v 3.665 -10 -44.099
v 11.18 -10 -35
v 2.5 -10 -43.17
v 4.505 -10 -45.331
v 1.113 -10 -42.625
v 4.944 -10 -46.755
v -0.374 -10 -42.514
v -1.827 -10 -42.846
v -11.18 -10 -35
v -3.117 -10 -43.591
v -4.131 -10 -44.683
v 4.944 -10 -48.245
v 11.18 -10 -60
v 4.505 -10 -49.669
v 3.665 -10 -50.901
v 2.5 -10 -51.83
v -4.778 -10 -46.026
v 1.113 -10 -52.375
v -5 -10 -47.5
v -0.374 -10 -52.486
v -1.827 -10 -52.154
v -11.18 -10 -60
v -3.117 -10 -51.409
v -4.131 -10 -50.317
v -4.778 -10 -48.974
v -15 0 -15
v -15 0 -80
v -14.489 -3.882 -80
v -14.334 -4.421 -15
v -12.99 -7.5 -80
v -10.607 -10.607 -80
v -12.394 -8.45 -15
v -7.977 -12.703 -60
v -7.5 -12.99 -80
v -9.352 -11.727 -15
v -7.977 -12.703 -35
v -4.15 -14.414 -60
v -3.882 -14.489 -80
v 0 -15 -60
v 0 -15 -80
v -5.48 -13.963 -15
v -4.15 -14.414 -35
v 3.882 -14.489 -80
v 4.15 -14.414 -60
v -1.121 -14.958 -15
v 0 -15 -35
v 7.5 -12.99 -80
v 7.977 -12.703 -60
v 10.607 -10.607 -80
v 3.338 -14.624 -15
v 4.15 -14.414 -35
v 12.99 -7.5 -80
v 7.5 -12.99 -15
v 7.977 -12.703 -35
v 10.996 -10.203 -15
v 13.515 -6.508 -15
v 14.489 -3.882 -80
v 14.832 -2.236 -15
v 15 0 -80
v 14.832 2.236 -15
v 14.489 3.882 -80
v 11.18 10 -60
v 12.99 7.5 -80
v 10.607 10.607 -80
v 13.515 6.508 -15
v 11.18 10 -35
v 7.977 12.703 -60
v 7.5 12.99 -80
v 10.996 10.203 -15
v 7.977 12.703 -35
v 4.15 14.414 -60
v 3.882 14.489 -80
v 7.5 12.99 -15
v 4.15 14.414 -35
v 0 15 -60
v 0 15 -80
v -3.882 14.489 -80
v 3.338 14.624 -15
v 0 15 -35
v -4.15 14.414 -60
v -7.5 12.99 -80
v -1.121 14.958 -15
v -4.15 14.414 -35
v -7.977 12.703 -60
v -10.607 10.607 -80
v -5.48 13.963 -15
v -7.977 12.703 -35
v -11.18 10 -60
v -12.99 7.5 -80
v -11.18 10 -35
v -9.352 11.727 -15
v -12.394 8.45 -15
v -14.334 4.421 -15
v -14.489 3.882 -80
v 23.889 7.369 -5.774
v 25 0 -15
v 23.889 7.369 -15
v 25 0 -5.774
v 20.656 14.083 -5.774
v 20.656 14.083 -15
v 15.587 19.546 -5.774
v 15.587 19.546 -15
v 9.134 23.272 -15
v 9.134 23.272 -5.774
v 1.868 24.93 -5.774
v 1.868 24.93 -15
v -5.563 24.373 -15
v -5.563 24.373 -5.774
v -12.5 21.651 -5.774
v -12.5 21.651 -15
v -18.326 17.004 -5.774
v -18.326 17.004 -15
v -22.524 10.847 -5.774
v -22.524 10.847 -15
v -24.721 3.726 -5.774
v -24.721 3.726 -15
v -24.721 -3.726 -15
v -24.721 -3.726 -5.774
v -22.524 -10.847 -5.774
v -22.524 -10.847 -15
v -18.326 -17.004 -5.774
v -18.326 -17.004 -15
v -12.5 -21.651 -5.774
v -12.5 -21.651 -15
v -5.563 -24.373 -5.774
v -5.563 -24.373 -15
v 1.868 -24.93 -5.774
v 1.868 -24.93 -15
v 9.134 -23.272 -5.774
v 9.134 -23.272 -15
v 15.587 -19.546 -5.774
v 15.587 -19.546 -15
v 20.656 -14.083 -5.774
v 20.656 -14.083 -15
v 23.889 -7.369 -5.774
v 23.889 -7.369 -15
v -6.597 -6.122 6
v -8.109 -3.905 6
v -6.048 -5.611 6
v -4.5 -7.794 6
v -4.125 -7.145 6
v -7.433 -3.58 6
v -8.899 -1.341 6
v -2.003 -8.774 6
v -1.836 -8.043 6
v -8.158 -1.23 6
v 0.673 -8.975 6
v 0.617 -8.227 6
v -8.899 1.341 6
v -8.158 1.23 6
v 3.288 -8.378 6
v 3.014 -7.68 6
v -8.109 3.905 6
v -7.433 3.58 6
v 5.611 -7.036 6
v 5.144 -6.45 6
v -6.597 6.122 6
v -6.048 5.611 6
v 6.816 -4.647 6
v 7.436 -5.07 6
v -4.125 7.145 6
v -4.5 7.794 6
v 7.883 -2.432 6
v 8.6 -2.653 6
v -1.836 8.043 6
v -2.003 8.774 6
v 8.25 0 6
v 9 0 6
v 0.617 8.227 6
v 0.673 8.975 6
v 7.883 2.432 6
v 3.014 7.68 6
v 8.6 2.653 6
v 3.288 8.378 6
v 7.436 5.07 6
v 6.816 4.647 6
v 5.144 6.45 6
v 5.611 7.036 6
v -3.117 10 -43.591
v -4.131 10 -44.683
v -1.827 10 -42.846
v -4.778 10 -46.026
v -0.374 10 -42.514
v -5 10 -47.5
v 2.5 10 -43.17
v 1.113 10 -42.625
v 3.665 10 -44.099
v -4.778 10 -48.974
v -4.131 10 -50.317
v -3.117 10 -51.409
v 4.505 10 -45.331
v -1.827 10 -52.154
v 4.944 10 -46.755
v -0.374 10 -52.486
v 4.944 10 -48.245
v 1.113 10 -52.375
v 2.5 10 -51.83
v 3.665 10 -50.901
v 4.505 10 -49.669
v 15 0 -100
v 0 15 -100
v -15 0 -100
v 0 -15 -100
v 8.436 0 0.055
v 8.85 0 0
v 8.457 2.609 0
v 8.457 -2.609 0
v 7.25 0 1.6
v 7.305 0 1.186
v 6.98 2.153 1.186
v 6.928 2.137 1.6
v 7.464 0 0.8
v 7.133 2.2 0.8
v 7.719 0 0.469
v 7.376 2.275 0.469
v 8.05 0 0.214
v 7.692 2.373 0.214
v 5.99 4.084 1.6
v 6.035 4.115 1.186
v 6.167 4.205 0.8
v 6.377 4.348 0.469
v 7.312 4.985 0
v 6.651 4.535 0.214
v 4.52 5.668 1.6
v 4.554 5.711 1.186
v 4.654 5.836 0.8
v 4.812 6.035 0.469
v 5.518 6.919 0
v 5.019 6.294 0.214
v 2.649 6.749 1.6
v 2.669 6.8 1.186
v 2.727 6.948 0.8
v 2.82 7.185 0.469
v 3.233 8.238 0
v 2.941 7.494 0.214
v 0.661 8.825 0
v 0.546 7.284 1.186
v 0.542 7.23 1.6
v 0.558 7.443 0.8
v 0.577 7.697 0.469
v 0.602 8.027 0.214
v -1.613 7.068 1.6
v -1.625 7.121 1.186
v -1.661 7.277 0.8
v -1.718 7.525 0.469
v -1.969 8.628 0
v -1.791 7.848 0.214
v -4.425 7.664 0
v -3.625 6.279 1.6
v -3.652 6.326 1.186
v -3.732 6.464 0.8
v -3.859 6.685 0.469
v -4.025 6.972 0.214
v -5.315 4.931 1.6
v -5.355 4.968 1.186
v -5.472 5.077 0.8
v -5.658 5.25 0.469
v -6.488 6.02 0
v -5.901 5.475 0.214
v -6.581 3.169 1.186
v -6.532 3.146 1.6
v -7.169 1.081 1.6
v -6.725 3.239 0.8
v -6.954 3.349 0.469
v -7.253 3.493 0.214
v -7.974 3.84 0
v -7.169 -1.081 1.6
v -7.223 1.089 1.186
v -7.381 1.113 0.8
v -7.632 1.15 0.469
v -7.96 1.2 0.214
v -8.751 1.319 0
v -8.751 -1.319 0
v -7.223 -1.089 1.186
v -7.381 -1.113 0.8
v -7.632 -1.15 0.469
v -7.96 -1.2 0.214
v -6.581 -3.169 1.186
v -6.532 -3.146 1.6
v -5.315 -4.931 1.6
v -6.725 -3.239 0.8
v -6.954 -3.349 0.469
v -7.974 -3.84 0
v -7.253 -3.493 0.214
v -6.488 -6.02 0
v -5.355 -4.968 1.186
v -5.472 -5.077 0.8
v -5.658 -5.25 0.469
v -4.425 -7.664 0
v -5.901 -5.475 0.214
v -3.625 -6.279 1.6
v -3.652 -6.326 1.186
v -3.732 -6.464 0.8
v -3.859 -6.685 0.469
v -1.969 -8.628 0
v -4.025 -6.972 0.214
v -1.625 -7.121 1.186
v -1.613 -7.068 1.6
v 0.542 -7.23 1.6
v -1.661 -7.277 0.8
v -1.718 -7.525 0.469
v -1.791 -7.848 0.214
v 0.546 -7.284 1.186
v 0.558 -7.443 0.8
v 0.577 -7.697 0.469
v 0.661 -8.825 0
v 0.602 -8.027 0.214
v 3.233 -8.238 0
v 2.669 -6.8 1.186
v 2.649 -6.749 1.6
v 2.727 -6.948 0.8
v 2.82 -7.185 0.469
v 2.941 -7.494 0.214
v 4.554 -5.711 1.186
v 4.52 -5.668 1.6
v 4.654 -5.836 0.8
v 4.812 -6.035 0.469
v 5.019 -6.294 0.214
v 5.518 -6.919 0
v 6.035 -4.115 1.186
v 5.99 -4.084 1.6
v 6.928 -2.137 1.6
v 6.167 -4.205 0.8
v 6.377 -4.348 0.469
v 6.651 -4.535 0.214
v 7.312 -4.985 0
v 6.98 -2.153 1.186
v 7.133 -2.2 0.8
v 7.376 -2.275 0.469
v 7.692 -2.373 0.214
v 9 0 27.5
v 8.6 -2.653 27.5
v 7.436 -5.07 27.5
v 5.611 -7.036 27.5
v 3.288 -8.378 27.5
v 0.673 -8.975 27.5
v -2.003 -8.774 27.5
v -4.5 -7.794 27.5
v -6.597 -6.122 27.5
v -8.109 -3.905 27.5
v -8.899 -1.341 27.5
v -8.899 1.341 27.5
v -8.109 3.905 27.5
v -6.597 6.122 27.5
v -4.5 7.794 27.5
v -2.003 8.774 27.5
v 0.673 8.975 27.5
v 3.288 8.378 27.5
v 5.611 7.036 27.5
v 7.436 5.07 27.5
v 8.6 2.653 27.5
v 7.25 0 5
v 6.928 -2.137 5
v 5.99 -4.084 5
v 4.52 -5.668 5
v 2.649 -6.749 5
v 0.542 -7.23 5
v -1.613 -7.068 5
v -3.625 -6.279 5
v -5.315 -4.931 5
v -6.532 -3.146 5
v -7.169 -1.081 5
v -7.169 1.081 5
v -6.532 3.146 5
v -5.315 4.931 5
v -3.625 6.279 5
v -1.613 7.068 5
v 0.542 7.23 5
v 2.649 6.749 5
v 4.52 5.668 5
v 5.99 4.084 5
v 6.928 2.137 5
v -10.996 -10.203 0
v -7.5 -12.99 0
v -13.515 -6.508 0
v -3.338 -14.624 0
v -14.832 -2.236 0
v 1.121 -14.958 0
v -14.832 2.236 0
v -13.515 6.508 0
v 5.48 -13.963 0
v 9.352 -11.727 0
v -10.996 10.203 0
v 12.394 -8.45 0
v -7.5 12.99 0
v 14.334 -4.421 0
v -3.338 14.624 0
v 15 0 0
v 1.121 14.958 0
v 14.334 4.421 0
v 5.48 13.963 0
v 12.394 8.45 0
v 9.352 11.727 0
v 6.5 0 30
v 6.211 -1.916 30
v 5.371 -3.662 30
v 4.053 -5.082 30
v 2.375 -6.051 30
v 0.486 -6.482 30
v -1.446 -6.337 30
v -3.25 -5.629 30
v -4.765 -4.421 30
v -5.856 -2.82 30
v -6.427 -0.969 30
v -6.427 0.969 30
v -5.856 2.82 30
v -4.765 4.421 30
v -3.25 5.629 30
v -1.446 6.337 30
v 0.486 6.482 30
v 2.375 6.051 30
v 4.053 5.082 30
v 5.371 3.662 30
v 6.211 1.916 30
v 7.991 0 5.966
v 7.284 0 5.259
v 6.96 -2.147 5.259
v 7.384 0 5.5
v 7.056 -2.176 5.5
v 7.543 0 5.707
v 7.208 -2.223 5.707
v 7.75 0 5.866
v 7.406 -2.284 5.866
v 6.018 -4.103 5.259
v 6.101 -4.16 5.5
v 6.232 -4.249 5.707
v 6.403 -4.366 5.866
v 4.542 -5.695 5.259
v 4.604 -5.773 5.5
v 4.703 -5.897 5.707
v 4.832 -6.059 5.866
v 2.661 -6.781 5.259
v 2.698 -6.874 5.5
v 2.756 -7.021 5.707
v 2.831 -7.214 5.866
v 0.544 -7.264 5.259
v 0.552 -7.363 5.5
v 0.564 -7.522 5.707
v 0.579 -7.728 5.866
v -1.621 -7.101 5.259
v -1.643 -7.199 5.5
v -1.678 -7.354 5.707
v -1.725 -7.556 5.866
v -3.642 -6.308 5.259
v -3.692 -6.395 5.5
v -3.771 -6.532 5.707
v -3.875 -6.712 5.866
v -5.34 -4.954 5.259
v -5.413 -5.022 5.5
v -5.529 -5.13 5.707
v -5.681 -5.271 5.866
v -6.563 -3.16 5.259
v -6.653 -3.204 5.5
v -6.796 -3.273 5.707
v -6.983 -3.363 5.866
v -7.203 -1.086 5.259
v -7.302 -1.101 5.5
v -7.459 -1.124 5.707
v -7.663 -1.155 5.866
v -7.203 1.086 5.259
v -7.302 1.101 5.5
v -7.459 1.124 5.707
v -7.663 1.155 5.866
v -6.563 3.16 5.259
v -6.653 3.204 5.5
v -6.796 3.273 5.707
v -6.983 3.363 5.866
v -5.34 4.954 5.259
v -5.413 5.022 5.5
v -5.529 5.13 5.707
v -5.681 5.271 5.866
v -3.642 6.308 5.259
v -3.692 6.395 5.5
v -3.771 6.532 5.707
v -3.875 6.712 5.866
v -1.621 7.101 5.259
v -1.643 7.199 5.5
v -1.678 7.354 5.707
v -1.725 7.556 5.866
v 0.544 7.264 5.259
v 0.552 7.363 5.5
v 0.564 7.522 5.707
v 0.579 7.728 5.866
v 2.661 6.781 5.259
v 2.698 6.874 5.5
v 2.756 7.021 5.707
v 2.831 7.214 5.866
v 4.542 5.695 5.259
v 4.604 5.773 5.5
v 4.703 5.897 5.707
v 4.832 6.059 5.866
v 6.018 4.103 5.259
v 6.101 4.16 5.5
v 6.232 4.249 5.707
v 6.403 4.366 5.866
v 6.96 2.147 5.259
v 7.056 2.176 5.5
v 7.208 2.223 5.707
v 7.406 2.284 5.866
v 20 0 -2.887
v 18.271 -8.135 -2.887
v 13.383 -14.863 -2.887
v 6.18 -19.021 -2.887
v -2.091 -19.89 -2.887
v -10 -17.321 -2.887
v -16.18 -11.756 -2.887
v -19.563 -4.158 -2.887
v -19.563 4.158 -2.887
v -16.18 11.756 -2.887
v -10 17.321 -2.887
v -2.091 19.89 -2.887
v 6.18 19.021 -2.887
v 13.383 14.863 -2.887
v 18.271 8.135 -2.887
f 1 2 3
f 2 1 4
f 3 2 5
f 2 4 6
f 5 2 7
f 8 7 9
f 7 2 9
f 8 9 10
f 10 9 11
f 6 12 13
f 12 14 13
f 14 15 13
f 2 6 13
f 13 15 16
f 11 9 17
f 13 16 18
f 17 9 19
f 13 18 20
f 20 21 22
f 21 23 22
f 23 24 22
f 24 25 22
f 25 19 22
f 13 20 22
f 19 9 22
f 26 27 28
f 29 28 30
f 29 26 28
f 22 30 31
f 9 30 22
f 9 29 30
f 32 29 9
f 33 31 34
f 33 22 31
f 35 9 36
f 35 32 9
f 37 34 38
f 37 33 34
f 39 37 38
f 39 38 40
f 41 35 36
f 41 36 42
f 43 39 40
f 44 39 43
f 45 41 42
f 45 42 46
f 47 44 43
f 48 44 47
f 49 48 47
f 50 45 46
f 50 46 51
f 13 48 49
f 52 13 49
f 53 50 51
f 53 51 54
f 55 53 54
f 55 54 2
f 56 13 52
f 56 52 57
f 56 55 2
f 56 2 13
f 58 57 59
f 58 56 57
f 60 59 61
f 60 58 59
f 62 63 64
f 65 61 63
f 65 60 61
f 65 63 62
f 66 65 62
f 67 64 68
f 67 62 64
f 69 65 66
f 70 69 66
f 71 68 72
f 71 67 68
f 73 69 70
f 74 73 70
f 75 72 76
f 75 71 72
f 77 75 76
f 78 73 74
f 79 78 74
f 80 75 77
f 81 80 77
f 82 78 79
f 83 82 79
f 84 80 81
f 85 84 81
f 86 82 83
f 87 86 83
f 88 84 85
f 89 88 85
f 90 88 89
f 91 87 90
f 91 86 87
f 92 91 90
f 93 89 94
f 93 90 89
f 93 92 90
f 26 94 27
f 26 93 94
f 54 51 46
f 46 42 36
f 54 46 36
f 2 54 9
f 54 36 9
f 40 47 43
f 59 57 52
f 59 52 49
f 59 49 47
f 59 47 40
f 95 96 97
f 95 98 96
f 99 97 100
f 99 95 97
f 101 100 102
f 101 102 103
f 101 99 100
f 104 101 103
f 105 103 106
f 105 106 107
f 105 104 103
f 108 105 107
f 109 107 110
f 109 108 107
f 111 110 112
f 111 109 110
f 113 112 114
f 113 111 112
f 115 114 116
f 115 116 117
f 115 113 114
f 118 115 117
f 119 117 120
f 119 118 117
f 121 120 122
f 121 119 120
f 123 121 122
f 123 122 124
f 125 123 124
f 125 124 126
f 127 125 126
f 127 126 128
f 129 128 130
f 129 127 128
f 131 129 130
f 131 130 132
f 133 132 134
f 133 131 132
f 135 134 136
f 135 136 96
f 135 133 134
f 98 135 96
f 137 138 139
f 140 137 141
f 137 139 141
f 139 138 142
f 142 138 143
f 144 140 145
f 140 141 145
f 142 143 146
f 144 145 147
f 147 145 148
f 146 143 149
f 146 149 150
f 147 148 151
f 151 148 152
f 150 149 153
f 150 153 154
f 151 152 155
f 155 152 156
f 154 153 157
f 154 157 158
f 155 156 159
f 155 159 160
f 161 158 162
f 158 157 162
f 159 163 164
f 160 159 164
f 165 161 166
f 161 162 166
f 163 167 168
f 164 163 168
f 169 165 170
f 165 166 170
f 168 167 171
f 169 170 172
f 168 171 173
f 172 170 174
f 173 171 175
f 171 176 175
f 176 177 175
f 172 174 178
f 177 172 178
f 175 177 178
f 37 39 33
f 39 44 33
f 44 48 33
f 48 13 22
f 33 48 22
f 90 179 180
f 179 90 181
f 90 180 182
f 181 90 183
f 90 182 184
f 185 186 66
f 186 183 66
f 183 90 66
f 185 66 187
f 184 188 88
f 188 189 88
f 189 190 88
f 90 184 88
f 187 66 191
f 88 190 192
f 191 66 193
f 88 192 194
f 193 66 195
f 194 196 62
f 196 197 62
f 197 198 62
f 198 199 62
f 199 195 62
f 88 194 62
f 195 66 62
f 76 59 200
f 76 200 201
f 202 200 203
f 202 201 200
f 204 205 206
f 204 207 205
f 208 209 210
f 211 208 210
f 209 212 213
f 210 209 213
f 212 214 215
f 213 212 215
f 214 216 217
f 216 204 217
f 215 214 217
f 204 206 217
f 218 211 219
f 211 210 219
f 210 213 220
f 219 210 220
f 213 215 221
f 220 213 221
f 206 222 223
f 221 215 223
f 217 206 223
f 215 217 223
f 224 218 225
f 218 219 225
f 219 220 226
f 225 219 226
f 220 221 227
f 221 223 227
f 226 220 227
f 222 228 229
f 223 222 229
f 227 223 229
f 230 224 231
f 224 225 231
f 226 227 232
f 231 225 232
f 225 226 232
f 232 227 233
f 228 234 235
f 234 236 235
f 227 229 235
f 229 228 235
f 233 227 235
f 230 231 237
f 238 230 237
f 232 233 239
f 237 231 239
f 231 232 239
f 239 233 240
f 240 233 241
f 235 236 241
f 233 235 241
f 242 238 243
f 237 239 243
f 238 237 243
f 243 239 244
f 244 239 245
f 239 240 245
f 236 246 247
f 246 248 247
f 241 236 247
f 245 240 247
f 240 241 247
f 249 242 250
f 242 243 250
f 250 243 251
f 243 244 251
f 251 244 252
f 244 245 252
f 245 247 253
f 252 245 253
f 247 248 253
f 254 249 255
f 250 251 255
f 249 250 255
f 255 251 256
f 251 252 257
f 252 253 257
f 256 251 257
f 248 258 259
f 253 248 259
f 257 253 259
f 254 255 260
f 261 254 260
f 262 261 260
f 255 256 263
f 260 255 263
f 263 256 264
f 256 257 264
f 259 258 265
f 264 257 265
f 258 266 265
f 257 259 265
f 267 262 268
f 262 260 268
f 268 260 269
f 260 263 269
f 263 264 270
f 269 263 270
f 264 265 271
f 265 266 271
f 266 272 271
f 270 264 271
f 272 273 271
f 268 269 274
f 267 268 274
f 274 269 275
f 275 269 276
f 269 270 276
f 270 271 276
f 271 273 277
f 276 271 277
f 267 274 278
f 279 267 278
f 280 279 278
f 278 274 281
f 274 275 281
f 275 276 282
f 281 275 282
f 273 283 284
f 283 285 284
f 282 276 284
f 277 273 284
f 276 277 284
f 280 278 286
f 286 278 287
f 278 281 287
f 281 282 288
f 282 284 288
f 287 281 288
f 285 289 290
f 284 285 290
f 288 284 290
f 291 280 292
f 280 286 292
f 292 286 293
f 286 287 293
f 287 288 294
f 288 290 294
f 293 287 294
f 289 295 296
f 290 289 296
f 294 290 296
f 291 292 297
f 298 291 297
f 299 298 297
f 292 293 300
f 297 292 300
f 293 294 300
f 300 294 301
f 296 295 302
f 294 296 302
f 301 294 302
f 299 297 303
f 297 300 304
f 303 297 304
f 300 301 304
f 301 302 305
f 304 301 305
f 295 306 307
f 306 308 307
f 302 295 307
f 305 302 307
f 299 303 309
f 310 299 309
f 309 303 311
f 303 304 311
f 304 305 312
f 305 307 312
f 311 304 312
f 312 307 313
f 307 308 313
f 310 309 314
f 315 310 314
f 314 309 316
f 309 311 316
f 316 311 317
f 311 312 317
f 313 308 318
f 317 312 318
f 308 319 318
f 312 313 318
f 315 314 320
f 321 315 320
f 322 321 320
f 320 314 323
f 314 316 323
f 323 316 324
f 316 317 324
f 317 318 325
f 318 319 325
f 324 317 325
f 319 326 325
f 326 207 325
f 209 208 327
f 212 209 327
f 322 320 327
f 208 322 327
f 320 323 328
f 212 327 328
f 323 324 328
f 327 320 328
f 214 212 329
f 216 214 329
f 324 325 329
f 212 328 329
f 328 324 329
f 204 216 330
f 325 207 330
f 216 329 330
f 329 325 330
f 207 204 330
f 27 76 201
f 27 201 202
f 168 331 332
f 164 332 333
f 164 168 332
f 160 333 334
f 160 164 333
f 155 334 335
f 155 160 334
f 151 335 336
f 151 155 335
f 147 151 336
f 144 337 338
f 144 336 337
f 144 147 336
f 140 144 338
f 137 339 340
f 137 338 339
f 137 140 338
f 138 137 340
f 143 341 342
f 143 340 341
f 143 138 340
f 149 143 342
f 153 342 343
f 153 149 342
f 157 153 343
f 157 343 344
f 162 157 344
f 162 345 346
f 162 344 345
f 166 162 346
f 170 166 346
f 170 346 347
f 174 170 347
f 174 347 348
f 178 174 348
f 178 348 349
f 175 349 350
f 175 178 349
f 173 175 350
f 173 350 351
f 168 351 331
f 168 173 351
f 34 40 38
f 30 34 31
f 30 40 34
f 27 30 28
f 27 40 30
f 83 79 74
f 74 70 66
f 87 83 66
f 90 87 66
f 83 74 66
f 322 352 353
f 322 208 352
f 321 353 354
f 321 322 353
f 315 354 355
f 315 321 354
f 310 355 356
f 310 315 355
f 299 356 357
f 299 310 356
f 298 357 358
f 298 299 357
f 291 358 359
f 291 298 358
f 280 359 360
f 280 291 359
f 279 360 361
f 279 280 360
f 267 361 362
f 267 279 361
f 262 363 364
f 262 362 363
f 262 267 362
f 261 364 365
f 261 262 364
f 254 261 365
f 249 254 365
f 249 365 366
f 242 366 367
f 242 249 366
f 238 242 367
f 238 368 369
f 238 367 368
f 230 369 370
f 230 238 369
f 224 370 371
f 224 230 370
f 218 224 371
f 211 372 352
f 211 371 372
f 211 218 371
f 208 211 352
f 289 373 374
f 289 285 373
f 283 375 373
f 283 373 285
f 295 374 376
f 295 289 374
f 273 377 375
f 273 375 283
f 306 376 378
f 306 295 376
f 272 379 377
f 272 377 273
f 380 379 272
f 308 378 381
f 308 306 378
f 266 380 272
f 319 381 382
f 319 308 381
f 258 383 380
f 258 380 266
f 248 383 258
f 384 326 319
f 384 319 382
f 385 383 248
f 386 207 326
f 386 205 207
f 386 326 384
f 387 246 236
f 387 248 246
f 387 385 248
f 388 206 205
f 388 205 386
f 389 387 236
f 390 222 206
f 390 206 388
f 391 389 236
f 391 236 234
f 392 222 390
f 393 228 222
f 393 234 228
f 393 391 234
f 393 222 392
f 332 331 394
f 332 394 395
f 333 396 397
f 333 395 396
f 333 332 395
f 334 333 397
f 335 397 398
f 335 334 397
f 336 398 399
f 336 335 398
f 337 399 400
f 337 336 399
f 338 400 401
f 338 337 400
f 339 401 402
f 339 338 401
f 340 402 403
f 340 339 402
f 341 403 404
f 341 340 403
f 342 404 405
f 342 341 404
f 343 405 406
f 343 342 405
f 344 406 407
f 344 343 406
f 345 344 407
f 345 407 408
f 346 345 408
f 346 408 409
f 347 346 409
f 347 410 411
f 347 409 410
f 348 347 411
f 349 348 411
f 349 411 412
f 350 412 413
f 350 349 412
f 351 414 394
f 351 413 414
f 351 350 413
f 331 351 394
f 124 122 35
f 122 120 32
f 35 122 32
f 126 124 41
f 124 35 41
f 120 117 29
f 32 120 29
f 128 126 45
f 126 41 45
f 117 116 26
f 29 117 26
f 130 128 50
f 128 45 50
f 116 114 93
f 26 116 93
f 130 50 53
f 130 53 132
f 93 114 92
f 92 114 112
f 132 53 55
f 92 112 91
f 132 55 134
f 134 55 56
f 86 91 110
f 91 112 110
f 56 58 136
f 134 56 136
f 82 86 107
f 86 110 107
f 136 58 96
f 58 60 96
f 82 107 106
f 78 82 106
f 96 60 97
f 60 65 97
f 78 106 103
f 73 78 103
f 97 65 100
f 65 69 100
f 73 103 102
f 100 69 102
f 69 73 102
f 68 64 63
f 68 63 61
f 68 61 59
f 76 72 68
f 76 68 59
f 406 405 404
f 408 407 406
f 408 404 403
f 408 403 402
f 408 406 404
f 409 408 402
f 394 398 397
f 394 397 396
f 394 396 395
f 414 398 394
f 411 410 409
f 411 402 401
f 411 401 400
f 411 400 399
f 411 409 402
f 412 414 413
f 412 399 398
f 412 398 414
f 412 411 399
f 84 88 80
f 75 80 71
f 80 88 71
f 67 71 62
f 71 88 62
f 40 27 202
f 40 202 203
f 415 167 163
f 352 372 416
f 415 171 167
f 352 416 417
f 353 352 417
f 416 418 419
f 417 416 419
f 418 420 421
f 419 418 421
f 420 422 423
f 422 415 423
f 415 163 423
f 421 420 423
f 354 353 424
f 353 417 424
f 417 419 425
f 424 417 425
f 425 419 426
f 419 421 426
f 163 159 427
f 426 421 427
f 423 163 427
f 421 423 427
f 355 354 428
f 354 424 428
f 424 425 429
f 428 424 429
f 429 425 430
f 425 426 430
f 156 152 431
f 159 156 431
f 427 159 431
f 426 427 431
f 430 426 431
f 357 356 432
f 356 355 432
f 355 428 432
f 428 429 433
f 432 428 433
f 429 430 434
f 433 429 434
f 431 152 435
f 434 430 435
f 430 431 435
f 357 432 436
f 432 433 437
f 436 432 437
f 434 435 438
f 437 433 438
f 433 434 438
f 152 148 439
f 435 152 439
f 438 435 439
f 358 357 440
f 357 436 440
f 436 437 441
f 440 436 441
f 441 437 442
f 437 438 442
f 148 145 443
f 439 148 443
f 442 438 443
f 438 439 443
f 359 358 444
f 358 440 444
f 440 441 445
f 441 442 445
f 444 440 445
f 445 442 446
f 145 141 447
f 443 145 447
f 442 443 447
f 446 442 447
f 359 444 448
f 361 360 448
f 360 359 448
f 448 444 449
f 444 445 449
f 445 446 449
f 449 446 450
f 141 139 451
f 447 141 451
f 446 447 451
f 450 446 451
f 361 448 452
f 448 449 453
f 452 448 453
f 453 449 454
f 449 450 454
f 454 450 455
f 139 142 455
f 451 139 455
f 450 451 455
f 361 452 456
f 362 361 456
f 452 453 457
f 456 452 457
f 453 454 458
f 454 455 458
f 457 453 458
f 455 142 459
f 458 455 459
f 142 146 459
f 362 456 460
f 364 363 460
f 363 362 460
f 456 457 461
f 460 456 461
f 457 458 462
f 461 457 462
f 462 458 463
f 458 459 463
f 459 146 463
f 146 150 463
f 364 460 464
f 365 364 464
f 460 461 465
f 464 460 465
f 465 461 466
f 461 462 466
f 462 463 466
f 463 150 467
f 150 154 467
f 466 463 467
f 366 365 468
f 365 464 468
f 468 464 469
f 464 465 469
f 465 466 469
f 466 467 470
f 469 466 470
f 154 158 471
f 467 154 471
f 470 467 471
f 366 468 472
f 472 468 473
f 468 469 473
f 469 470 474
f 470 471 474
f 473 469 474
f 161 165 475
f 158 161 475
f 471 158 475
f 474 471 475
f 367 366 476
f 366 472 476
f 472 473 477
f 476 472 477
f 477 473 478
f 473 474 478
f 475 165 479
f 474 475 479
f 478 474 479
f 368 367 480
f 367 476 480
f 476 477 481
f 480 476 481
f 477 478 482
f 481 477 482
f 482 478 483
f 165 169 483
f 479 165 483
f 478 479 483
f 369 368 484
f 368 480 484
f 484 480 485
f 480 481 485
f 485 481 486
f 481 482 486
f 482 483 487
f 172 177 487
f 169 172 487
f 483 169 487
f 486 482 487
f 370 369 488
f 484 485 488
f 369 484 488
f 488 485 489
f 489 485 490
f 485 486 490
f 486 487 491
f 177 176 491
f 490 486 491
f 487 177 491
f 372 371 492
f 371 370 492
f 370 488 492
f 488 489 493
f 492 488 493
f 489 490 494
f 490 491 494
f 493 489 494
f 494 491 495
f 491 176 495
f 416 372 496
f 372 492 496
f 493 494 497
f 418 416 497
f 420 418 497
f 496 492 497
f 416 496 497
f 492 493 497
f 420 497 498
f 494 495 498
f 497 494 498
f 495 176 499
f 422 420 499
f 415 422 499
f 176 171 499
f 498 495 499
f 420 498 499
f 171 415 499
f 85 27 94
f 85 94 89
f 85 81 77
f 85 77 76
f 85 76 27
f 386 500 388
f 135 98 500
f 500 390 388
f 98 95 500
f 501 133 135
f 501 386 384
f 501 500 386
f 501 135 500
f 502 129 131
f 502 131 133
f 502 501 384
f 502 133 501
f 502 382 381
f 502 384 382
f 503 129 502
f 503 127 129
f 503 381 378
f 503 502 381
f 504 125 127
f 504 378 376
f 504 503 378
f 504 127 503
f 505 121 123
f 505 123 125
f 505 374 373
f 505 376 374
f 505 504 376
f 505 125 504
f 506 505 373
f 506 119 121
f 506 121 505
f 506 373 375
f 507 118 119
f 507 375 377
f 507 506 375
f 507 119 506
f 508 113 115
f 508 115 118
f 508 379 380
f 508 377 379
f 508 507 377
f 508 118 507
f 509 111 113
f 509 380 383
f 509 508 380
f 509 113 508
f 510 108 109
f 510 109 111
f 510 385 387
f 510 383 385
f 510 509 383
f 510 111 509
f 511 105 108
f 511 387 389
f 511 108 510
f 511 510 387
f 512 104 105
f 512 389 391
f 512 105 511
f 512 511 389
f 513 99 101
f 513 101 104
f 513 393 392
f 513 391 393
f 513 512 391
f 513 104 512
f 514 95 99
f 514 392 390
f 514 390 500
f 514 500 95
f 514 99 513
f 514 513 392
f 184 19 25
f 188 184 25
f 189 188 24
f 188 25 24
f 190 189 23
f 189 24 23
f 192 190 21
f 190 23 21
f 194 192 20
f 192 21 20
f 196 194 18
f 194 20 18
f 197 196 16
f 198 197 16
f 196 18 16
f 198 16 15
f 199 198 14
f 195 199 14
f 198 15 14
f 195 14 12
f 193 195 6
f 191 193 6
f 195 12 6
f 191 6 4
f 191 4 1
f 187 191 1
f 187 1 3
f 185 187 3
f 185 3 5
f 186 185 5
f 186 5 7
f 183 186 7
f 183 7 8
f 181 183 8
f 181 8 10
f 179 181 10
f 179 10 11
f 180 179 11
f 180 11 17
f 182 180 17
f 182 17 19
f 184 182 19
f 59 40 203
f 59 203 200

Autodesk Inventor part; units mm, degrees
sketch "Эскиз1" plane through (0, 0, 0) normal (0, 0, 1) x (1, 0, 0)
  circle A0 centre (0, 0) radius 9
sketch "Эскиз2" plane through (0, 0, 0) normal (0, 0, 1) x (1, 0, 0)
  point P0 (0, 0)
extrude "Выдавливание1" add sketch "Эскиз1" along normal blind 30
ref_plane "РабПлоскость1" through (0, 0, 0) normal (0, 0, 1) x (1, 0, 0)
sketch "Эскиз3" plane through (0, 0, 0) normal (0, 0, 1) x (1, 0, 0)
  circle A0 centre (0, 0) radius 25
extrude "Выдавливание2" add sketch "Эскиз3" against normal blind 15
ref_plane "РабПлоскость2" through (0, 0, -15) normal (0, 0, -1) x (-1, 0, 0)
sketch "Эскиз4" plane through (0, 0, -15) normal (0, 0, -1) x (-1, 0, 0)
  circle A0 centre (0, 0) radius 15
extrude "Выдавливание3" add sketch "Эскиз4" along normal blind 20
ref_plane "РабПлоскость3" through (0, 0, -35) normal (0, 0, -1) x (-1, 0, 0)
sketch "Эскиз5" plane through (0, 0, -35) normal (0, 0, -1) x (-1, 0, 0)
  circle A0 centre (0, 0) radius 15
extrude "Выдавливание4" add sketch "Эскиз5" along normal blind 25
ref_plane "РабПлоскость4" through (0, 0, -60) normal (0, 0, -1) x (-1, 0, 0)
sketch "Эскиз6" plane through (0, 0, -60) normal (0, 0, -1) x (-1, 0, 0)
  circle A0 centre (0, 0) radius 9 projected
  circle A1 centre (0, 0) radius 15
extrude "Выдавливание5" add sketch "Эскиз6" along normal blind 20 contours A0 | A1
ref_plane "РабПлоскость5" through (0, 0, -80) normal (0, 0, -1) x (-1, 0, 0)
sketch "Эскиз7" plane through (0, 0, -80) normal (0, 0, -1) x (-1, 0, 0)
  circle A0 centre (0, 0) radius 15 projected
  line L0 (0, 15) -> (15, 0)
  line L1 (15, 0) -> (0, -15)
  line L2 (0, -15) -> (-15, 0)
  line L3 (-15, 0) -> (0, 15)
extrude "Выдавливание6" add sketch "Эскиз7" along normal blind 20 contours L1 L2 L3 L0
sketch "Эскиз8" plane through (0, 0, 0) normal (1, 0, 0) x (0, 1, 0)
  line L0 (0, 0) -> (0, -35)
  line L1 (0, -35) -> (10, -35)
  line L2 (10, -35) -> (-10, -35)
  line L3 (-10, -35) -> (-10, -60)
  line L4 (-10, -60) -> (-25, -60)
  line L5 (-25, -60) -> (-25, -35)
  line L6 (-25, -35) -> (-10, -35)
  line L7 (10, -35) -> (10, -60)
  line L8 (10, -60) -> (25, -60)
  line L9 (25, -60) -> (25, -35)
  line L10 (25, -35) -> (10, -35)
  dimension "d22" = 35
  dimension "d23" = 10
  dimension "d24" = 20
  dimension "d25" = 25
  dimension "d26" = 15
  dimension "d27" = 15
extrude "Выдавливание7" cut sketch "Эскиз8" against normal mid plane 40 contours L10 L9 L8 L7
sketch "Эскиз9" plane through (0, 0, 0) normal (1, 0, 0) x (0, 1, 0)
  line L0 (0, 0) -> (0, -35)
  line L1 (0, -35) -> (-10, -35)
  line L2 (-10, -35) -> (-10, -60)
  line L3 (-10, -60) -> (-25, -60)
  line L4 (-25, -60) -> (-25, -35)
  line L5 (-25, -35) -> (-10, -35)
  dimension "d30" = 35
  dimension "d31" = 10
  dimension "d32" = 25
  dimension "d33" = 15
extrude "Выдавливание8" cut sketch "Эскиз9" along normal mid plane 40
sketch "Эскиз10" plane through (0, 0, 0) normal (1, 0, 0) x (0, 1, 0)
  point P0 (0, 0)
sketch "Эскиз11" plane through (0, 0, 0) normal (0, 1, 0) x (-1, 0, 0)
  line L0 (0, 0) -> (0, -47.5)
  circle A0 centre (0, -47.5) radius 5
  dimension "d36" = 47.5
  dimension "d37" = 10
extrude "Выдавливание9" cut sketch "Эскиз11" along normal mid plane 40
chamfer "Фаска1" distance 2.5 angle 45 1 edges at (-9, 0, 30)
chamfer "Фаска2" distance 10 angle 30 1 edges at (-25, 0, 0) measured on face at (19.3373, -2.7122, 0)
sketch "Эскиз12" plane through (0, 0, 0) normal (0, 1, 0) x (-1, 0, 0)
  line L0 (0, 0) -> (25, 0)
  line L1 (25, 0) -> (25, 4)
  line L2 (25, 4) -> (25, 6)
  line L3 (25, 6) -> (-25.3406, 6)
  line L4 (-25.3406, 6) -> (-25.3406, 0)
  line L5 (-25.3406, 0) -> (25, 0)
  dimension "d48" = 4
  dimension "d49" = 2
extrude "Выдавливание10" cut sketch "Эскиз12" against normal mid plane 40
sketch "Эскиз13" plane through (0, 0, 0) normal (0, 0, 1) x (1, 0, 0)
  circle A0 centre (0, 0) radius 7.25
  dimension "d52" = 14.5
extrude "Выдавливание11" add sketch "Эскиз13" along normal blind 6
fillet "Сопряжение1" radius 1 1 edges at (-7.25, 0, 6)
thread "Резьба2" size "M18x1.25" class "6g" standard "ANSI Metric M Profile" length 24
fillet "Сопряжение2" radius 1.6 1 edges at (-7.25, 0, 0)
